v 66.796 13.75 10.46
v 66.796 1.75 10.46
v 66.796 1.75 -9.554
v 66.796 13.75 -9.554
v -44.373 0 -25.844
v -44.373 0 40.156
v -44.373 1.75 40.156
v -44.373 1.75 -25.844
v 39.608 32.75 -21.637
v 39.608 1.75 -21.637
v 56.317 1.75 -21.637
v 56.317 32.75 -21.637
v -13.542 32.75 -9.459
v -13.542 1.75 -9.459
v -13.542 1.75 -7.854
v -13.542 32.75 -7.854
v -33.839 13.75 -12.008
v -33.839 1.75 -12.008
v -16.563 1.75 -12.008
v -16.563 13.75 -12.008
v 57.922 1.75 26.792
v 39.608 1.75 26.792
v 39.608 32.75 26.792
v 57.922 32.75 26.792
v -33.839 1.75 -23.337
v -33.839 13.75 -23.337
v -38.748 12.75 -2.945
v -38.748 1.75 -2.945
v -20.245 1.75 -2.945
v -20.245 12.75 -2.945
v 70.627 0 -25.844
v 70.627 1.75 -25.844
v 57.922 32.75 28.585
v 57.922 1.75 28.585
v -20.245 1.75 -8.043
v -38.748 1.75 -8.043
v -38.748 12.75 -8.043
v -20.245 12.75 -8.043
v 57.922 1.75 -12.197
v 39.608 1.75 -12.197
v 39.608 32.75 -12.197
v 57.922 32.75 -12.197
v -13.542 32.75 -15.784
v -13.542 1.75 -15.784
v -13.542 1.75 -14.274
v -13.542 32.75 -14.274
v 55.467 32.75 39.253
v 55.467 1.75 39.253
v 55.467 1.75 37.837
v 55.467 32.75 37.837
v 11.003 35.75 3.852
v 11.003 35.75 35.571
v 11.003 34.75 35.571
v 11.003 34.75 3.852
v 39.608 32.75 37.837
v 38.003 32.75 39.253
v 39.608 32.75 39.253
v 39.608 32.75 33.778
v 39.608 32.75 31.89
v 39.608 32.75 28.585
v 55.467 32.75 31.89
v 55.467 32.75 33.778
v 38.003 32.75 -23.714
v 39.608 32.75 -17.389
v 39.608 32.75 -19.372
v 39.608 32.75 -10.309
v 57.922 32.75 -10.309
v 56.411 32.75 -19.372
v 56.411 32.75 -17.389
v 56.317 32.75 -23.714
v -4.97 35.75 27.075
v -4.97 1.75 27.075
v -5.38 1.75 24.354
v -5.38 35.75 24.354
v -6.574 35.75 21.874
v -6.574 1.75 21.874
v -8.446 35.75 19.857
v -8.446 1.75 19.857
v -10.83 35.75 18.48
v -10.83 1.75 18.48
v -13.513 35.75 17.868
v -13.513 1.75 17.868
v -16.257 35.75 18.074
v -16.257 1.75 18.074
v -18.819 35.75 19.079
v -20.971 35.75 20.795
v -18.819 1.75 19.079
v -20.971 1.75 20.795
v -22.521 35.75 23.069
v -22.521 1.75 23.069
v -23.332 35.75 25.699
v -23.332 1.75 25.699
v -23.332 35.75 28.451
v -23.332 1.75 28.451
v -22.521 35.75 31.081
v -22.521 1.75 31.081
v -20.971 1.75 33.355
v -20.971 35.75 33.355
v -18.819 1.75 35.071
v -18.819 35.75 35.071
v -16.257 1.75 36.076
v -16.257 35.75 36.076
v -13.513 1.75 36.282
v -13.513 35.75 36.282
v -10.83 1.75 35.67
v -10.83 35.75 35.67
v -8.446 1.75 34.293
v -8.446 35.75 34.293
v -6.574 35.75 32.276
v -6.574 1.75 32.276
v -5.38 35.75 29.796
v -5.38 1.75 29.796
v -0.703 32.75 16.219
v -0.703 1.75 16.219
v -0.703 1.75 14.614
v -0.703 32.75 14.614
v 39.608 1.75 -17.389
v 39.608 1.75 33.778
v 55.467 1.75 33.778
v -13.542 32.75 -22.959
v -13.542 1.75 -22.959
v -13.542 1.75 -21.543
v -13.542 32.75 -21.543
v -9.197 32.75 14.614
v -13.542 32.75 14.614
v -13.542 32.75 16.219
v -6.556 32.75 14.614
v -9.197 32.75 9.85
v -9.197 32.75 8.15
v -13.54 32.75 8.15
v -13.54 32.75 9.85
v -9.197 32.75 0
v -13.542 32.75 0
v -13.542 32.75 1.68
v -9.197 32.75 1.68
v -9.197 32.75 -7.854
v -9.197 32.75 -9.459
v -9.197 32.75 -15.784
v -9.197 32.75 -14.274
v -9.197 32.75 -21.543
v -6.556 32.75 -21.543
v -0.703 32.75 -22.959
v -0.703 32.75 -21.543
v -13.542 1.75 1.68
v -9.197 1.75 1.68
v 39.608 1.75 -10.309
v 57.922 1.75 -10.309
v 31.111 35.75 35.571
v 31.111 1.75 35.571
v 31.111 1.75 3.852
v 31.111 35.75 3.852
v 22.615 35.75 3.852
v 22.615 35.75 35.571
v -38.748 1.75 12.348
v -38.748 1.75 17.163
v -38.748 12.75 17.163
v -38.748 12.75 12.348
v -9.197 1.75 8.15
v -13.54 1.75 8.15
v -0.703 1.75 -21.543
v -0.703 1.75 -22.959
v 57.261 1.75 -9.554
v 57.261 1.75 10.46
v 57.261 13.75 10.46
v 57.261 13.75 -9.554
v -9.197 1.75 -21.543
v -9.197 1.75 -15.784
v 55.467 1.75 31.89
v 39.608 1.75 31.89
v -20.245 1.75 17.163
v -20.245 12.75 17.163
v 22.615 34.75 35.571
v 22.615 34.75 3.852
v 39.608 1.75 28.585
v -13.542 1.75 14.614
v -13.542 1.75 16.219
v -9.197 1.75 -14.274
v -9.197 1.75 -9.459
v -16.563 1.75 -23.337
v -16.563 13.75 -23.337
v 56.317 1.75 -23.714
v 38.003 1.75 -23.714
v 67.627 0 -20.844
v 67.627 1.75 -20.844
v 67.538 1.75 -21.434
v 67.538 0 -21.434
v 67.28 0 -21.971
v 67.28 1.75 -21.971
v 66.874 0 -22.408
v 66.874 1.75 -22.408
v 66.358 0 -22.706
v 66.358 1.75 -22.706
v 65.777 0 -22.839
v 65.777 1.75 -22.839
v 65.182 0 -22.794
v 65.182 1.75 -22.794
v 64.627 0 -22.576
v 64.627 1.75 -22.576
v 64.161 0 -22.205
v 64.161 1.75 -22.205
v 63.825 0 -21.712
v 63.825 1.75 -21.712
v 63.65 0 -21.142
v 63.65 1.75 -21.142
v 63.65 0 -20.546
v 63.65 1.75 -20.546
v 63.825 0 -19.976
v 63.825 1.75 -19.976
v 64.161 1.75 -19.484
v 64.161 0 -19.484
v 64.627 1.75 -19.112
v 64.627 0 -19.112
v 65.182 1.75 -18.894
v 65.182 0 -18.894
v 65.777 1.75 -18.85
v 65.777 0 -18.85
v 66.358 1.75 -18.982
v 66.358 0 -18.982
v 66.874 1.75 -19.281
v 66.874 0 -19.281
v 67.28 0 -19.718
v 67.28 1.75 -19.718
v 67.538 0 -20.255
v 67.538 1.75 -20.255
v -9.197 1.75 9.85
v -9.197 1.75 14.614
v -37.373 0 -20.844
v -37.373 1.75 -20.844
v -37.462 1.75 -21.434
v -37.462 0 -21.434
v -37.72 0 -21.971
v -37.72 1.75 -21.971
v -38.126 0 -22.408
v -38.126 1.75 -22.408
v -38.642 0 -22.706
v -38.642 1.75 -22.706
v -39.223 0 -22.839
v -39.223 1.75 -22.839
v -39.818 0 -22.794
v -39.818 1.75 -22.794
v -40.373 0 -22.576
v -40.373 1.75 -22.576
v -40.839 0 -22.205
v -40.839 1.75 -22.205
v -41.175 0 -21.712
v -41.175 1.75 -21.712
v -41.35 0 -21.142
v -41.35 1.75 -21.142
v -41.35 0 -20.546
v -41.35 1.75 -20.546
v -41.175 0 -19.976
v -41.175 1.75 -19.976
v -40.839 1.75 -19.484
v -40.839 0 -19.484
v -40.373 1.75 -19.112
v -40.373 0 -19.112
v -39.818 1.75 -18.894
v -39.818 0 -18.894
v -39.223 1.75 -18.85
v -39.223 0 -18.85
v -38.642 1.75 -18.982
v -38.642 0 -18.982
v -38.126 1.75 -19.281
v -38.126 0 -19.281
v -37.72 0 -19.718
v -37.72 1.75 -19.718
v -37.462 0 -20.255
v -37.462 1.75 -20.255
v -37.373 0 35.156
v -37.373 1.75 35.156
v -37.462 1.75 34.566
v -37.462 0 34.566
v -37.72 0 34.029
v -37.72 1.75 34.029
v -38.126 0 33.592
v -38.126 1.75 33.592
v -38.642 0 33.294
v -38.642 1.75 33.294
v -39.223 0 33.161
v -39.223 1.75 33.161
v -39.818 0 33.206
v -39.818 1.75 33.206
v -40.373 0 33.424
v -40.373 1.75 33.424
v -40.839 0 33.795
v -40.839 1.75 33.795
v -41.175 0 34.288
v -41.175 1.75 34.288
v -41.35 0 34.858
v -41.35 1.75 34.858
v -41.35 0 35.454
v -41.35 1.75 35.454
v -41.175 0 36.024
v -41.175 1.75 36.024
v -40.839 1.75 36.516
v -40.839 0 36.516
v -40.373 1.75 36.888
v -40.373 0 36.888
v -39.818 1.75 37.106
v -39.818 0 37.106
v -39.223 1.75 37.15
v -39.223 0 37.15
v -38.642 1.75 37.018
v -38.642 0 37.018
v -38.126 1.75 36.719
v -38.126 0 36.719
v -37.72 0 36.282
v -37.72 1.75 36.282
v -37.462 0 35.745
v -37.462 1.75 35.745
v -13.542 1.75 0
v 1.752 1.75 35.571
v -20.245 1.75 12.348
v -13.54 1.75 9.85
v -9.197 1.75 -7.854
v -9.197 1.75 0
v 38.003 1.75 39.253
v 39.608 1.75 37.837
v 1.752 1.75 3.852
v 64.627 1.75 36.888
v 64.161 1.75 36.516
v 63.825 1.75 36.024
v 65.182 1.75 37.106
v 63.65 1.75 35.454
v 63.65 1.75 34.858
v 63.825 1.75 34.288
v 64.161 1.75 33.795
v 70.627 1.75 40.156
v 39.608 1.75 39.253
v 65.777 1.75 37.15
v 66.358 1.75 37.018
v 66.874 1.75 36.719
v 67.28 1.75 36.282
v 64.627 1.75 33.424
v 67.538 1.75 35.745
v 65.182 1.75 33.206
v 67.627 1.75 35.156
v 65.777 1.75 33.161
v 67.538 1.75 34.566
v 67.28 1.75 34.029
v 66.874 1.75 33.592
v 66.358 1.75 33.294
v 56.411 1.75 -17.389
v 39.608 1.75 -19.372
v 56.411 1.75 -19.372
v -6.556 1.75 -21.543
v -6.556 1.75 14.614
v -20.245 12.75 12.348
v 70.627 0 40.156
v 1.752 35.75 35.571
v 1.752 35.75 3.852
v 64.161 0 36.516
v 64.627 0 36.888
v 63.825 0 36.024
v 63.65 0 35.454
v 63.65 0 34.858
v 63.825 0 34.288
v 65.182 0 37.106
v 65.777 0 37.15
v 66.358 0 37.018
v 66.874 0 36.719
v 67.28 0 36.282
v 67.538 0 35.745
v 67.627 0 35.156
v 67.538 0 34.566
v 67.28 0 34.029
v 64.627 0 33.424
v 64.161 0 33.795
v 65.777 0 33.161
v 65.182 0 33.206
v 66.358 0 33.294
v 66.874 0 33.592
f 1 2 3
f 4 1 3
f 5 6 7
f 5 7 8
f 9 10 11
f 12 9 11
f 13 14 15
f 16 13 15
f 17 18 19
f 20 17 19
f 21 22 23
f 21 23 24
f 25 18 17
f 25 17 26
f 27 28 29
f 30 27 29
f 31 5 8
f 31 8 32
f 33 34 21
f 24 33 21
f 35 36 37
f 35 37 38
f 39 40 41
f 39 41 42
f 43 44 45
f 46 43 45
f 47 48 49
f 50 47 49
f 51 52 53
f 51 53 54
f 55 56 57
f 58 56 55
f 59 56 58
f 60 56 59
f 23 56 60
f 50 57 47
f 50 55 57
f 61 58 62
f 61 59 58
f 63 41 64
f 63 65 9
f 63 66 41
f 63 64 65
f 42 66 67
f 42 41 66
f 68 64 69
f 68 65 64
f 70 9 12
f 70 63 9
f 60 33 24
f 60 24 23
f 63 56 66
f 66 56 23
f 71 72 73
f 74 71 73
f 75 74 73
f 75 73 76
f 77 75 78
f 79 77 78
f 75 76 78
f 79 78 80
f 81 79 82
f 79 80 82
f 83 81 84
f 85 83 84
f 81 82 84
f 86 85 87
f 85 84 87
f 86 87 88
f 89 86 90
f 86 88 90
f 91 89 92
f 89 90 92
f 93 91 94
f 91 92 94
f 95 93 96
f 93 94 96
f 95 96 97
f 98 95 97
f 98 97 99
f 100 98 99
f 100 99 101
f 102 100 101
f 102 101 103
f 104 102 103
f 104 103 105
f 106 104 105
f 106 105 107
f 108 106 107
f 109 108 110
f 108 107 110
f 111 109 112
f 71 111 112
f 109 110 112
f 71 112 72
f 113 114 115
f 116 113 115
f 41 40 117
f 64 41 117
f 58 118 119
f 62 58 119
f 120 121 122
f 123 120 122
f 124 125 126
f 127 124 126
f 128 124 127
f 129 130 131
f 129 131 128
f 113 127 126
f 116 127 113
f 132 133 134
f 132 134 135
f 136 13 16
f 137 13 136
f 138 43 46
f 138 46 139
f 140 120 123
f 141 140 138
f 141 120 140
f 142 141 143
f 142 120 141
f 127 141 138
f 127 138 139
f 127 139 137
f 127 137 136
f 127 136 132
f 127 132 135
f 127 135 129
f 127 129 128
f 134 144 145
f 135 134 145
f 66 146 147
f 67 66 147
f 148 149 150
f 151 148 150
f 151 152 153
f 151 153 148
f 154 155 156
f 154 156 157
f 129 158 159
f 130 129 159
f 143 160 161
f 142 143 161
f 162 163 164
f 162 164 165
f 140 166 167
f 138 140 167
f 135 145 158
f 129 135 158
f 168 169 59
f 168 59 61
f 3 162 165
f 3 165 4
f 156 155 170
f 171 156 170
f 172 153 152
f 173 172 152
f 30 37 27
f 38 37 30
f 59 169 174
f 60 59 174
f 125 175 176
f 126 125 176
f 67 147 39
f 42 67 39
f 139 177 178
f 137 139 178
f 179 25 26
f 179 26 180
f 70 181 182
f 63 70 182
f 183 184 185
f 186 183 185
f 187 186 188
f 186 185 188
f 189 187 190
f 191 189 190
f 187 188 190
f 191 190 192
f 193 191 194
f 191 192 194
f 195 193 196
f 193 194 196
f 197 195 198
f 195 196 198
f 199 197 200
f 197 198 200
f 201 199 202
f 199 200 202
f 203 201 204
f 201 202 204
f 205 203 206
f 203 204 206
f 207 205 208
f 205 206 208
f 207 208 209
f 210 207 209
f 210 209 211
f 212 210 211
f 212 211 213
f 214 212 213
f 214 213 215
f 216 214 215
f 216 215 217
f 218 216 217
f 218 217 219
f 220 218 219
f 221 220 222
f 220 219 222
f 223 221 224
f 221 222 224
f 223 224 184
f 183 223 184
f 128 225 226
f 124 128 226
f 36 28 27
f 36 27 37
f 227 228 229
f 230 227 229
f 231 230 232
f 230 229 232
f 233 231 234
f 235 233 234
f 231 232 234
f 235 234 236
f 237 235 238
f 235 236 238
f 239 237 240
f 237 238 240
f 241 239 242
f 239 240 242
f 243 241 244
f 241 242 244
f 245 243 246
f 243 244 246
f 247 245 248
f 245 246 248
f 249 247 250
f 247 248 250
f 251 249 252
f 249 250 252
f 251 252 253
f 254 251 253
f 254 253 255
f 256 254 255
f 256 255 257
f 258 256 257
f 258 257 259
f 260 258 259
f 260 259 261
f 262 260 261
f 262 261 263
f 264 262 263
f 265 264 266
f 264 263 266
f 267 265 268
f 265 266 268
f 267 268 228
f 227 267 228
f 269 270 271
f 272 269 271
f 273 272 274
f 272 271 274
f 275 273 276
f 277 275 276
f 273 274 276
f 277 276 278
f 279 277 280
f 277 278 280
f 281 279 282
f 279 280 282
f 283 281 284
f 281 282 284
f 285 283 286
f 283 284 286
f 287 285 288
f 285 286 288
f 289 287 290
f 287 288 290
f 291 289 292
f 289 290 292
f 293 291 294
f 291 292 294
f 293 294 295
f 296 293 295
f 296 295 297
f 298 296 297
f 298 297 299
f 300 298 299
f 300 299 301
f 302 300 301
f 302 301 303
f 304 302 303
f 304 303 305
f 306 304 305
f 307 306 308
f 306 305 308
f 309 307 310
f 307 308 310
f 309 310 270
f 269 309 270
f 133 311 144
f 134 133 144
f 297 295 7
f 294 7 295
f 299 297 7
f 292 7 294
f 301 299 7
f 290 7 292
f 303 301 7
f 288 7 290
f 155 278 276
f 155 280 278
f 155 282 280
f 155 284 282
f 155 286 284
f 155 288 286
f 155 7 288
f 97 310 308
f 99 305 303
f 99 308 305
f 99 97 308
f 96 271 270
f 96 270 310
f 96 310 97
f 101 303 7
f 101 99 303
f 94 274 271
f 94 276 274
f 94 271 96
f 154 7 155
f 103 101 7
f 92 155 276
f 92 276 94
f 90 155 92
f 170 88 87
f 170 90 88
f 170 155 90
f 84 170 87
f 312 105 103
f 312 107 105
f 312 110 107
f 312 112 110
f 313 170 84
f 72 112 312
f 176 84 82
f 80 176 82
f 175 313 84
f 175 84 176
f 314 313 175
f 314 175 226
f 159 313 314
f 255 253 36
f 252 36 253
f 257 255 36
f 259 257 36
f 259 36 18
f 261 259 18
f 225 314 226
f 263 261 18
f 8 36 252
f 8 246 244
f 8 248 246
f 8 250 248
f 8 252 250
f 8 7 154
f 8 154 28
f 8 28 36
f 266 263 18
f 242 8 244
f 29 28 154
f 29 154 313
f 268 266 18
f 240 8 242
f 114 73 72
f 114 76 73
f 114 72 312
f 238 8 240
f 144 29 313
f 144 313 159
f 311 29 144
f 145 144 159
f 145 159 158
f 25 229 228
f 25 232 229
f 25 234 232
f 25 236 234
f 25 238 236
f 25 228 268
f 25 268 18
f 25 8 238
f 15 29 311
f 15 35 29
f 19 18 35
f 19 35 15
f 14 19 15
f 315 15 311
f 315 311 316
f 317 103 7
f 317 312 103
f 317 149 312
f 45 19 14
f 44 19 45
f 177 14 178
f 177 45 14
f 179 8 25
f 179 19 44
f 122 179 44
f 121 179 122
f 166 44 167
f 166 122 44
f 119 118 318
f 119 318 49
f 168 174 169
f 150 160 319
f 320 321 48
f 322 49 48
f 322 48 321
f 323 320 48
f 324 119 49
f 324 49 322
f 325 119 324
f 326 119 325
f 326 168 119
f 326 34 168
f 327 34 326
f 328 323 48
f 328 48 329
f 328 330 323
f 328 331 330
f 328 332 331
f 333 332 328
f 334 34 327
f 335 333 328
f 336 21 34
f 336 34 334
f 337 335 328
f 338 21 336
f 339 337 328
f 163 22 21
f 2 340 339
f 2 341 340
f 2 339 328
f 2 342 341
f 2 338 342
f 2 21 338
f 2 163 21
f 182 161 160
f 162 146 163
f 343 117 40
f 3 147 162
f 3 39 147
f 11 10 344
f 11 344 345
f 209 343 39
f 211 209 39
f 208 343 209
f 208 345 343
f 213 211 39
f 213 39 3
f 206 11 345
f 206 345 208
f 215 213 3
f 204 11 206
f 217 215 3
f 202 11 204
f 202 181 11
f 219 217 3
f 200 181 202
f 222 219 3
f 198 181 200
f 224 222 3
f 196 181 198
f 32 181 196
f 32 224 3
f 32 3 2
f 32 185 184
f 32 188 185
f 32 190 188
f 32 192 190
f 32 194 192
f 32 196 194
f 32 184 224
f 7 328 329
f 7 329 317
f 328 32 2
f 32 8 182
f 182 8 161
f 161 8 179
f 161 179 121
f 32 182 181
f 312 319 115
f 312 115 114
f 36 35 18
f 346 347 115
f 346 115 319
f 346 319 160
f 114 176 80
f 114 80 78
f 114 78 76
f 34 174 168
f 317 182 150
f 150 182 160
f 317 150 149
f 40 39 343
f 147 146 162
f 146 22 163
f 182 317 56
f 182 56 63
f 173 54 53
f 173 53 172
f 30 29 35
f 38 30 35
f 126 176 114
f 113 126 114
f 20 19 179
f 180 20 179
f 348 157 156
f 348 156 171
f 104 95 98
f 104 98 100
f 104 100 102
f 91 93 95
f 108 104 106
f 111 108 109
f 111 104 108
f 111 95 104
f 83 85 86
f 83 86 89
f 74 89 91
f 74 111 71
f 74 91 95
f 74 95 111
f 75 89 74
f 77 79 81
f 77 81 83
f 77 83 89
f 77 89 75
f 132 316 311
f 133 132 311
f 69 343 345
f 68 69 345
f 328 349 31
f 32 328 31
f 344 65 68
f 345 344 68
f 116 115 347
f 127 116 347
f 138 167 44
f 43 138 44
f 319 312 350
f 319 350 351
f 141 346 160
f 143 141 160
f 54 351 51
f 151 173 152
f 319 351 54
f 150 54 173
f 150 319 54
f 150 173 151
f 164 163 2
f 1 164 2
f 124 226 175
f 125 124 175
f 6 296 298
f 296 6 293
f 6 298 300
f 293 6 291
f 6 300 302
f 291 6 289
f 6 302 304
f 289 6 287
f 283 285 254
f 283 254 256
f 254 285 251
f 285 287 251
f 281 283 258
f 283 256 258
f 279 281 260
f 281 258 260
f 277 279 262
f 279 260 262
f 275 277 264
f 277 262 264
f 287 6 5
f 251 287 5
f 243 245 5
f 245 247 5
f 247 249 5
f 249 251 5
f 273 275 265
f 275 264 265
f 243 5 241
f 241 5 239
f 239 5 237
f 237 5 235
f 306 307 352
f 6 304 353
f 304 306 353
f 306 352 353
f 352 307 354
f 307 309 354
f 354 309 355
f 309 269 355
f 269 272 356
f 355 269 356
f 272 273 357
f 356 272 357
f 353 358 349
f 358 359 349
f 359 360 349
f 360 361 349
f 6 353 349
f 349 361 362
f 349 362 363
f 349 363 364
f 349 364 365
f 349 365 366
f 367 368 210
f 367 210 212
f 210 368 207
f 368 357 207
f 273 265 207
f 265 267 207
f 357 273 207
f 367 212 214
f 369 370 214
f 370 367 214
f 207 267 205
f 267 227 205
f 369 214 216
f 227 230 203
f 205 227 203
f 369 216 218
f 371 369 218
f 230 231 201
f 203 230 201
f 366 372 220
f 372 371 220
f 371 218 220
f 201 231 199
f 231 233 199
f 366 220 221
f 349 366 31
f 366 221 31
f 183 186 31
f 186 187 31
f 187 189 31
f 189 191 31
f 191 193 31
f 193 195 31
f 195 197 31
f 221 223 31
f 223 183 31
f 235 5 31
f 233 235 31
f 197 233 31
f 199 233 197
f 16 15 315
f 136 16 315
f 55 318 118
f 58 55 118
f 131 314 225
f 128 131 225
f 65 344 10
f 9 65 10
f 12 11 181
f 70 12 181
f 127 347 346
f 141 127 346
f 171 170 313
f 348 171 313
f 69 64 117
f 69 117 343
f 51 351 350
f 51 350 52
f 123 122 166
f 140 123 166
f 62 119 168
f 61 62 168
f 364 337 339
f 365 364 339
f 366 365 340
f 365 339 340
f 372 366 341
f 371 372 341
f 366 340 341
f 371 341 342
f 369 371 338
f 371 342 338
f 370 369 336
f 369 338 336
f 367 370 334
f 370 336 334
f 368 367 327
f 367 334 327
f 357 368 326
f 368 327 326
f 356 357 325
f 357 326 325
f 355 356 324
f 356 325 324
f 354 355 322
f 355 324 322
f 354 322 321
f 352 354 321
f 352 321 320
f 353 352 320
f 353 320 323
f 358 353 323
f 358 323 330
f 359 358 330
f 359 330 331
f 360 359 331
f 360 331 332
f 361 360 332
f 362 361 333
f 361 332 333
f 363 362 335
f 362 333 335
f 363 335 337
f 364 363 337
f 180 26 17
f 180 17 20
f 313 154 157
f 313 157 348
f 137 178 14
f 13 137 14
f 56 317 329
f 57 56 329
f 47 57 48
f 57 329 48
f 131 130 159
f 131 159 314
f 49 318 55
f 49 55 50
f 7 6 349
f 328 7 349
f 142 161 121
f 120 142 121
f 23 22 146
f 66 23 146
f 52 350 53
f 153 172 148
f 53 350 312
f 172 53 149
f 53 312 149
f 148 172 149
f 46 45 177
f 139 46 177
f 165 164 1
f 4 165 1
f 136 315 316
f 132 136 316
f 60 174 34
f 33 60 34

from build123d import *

# Parameters (mm, degrees)
SKETCH1_W           = 115
SKETCH1_H           = 66
BOSS_EXTRUDE1_DEPTH = 1.75
SKETCH2_R           = 2
CUT_EXTRUDE1_DEPTH  = 1.75
SKETCH3_W           = 17.275912382
SKETCH3_H           = 11.328467136
BOSS_EXTRUDE2_DEPTH = 12
SKETCH4_W           = 29.359610659
SKETCH4_H           = 31.719707979
BOSS_EXTRUDE3_DEPTH = 34
SKETCH5_R           = 9.232777937
BOSS_EXTRUDE4_DEPTH = 34
SKETCH6_W           = 9.534793173
SKETCH6_H           = 20.013625273
BOSS_EXTRUDE5_DEPTH = 12
SKETCH7_W           = 18.314355202
SKETCH7_H           = 1.793673963
SKETCH7_W_2         = 1.604866178
SKETCH7_H_2         = 62.967396494
SKETCH7_W_3         = 15.859853989
SKETCH7_H_3         = 1.888077856
SKETCH7_H_4         = 1.416058391
SKETCH7_W_4         = 16.709489025
SKETCH7_H_5         = 2.076885642
SKETCH7_W_5         = 16.803892917
SKETCH7_H_6         = 1.982481748
BOSS_EXTRUDE6_DEPTH = 31
BOSS_EXTRUDE7_DEPTH = 31
SKETCH9_W           = 11.611678814
SKETCH9_H           = 31.719707979
CUT_EXTRUDE2_DEPTH  = 1
SKETCH11_W          = 18.503162988
SKETCH11_H          = 5.097810211
SKETCH11_H_2        = 4.814598532
BOSS_EXTRUDE8_DEPTH = 11


with BuildPart() as part:
    # Sketch1 → Boss-Extrude1 (new body)
    with BuildSketch(Plane(origin=(0, 0, 0), x_dir=(1, 0, 0), z_dir=(0, 1, 0))):
        with Locations((13.127229489, -7.155766944)):
            Rectangle(SKETCH1_W, SKETCH1_H)
    extrude(amount=BOSS_EXTRUDE1_DEPTH)

    # Sketch2 → Cut-Extrude1 (cut)
    with BuildSketch(Plane(origin=(0, 1.75, 0), x_dir=(1, 0, 0), z_dir=(0, 1, 0))):
        with Locations((65.627229489, 20.844233056)):
            Circle(SKETCH2_R)
        with Locations((65.627229489, -35.155766944)):
            Circle(SKETCH2_R)
        with Locations((-39.372770511, 20.844233056)):
            Circle(SKETCH2_R)
        with Locations((-39.372770511, -35.155766944)):
            Circle(SKETCH2_R)
    extrude(amount=-CUT_EXTRUDE1_DEPTH, mode=Mode.SUBTRACT)

    # Sketch3 → Boss-Extrude2 (add)
    with BuildSketch(Plane(origin=(0, 1.75, 0), x_dir=(1, 0, 0), z_dir=(0, 1, 0))):
        with Locations((-25.200750986, 17.672456861)):
            Rectangle(SKETCH3_W, SKETCH3_H)
    extrude(amount=BOSS_EXTRUDE2_DEPTH)

    # Sketch4 → Boss-Extrude3 (add)
    with BuildSketch(Plane(origin=(0, 1.75, 0), x_dir=(1, 0, 0), z_dir=(0, 1, 0))):
        with Locations((16.431365737, -19.711484686)):
            Rectangle(SKETCH4_W, SKETCH4_H)
    extrude(amount=BOSS_EXTRUDE3_DEPTH)

    # Sketch5 → Boss-Extrude4 (add)
    with BuildSketch(Plane(origin=(0, 1.75, 0), x_dir=(1, 0, 0), z_dir=(0, 1, 0))):
        with Locations((-14.202697476, -27.074988324)):
            Circle(SKETCH5_R)
    extrude(amount=BOSS_EXTRUDE4_DEPTH)

    # Sketch6 → Boss-Extrude5 (add)
    with BuildSketch(Plane(origin=(0, 1.75, 0), x_dir=(1, 0, 0), z_dir=(0, 1, 0))):
        with Locations((62.028445957, -0.453090556)):
            Rectangle(SKETCH6_W, SKETCH6_H)
    extrude(amount=BOSS_EXTRUDE5_DEPTH)

    # Sketch7 → Boss-Extrude6 (add)
    with BuildSketch(Plane(origin=(0, 1.75, 0), x_dir=(1, 0, 0), z_dir=(0, 1, 0))):
        with Locations((48.764699019, -27.688613628)):
            Rectangle(SKETCH7_W, SKETCH7_H)
        with Locations((38.805088329, -7.769392247)):
            Rectangle(SKETCH7_W_2, SKETCH7_H_2)
        with Locations((47.537448413, -32.833625784)):
            Rectangle(SKETCH7_W_3, SKETCH7_H_3)
        with Locations((47.537448413, -38.545061299)):
            Rectangle(SKETCH7_W_3, SKETCH7_H_4)
        with Locations((48.764699019, 11.252992151)):
            Rectangle(SKETCH7_W, SKETCH7_H_3)
        with Locations((47.962265931, 22.675863179)):
            Rectangle(SKETCH7_W_4, SKETCH7_H_5)
        with Locations((48.009467877, 18.380486057)):
            Rectangle(SKETCH7_W_5, SKETCH7_H_6)
    extrude(amount=BOSS_EXTRUDE6_DEPTH)

    # Sketch8 → Boss-Extrude7 (add)
    with BuildSketch(Plane(origin=(0, 1.75, 0), x_dir=(1, 0, 0), z_dir=(0, 1, 0))):
        Polygon((-13.541870226, 21.543016466), (-9.197015675, 21.543016466), (-9.197015675, 15.784379005), (-13.541870226, 15.784379005), (-13.541870226, 14.27391672), (-9.197015675, 14.27391672), (-9.197015675, 9.459318188), (-13.541870226, 9.459318188), (-13.541870226, 7.85445201), (-9.197015675, 7.85445201), (-9.197015675, 0), (-13.541870226, 0), (-13.541870226, -1.680341162), (-9.197015675, -1.680341162), (-9.197015675, -8.150462062), (-13.539594744, -8.150462062), (-13.539594744, -9.849732132), (-9.197015675, -9.849732132), (-9.197015675, -14.613674475), (-13.541870226, -14.613674475), (-13.541870226, -16.218540652), (-0.702940806, -16.218540652), (-0.702940806, -14.613674475), (-6.555982159, -14.613674475), (-6.555982159, 21.543016466), (-0.702940806, 21.543016466), (-0.702940806, 22.959074858), (-13.541870226, 22.959074858), align=None)
    extrude(amount=BOSS_EXTRUDE7_DEPTH)

    # Sketch9 → Cut-Extrude2 (cut)
    with BuildSketch(Plane(origin=(0, 35.75, 0), x_dir=(1, 0, 0), z_dir=(0, 1, 0))):
        with Locations((16.808981308, -19.711484686)):
            Rectangle(SKETCH9_W, SKETCH9_H)
    extrude(amount=-CUT_EXTRUDE2_DEPTH, mode=Mode.SUBTRACT)

    # Sketch11 → Boss-Extrude8 (add)
    with BuildSketch(Plane(origin=(0, 1.75, 0), x_dir=(1, 0, 0), z_dir=(0, 1, 0))):
        with Locations((-29.496128108, 5.494354691)):
            Rectangle(SKETCH11_W, SKETCH11_H)
        with Locations((-29.496128108, -14.755280314)):
            Rectangle(SKETCH11_W, SKETCH11_H_2)
    extrude(amount=BOSS_EXTRUDE8_DEPTH)


solid = part.part
